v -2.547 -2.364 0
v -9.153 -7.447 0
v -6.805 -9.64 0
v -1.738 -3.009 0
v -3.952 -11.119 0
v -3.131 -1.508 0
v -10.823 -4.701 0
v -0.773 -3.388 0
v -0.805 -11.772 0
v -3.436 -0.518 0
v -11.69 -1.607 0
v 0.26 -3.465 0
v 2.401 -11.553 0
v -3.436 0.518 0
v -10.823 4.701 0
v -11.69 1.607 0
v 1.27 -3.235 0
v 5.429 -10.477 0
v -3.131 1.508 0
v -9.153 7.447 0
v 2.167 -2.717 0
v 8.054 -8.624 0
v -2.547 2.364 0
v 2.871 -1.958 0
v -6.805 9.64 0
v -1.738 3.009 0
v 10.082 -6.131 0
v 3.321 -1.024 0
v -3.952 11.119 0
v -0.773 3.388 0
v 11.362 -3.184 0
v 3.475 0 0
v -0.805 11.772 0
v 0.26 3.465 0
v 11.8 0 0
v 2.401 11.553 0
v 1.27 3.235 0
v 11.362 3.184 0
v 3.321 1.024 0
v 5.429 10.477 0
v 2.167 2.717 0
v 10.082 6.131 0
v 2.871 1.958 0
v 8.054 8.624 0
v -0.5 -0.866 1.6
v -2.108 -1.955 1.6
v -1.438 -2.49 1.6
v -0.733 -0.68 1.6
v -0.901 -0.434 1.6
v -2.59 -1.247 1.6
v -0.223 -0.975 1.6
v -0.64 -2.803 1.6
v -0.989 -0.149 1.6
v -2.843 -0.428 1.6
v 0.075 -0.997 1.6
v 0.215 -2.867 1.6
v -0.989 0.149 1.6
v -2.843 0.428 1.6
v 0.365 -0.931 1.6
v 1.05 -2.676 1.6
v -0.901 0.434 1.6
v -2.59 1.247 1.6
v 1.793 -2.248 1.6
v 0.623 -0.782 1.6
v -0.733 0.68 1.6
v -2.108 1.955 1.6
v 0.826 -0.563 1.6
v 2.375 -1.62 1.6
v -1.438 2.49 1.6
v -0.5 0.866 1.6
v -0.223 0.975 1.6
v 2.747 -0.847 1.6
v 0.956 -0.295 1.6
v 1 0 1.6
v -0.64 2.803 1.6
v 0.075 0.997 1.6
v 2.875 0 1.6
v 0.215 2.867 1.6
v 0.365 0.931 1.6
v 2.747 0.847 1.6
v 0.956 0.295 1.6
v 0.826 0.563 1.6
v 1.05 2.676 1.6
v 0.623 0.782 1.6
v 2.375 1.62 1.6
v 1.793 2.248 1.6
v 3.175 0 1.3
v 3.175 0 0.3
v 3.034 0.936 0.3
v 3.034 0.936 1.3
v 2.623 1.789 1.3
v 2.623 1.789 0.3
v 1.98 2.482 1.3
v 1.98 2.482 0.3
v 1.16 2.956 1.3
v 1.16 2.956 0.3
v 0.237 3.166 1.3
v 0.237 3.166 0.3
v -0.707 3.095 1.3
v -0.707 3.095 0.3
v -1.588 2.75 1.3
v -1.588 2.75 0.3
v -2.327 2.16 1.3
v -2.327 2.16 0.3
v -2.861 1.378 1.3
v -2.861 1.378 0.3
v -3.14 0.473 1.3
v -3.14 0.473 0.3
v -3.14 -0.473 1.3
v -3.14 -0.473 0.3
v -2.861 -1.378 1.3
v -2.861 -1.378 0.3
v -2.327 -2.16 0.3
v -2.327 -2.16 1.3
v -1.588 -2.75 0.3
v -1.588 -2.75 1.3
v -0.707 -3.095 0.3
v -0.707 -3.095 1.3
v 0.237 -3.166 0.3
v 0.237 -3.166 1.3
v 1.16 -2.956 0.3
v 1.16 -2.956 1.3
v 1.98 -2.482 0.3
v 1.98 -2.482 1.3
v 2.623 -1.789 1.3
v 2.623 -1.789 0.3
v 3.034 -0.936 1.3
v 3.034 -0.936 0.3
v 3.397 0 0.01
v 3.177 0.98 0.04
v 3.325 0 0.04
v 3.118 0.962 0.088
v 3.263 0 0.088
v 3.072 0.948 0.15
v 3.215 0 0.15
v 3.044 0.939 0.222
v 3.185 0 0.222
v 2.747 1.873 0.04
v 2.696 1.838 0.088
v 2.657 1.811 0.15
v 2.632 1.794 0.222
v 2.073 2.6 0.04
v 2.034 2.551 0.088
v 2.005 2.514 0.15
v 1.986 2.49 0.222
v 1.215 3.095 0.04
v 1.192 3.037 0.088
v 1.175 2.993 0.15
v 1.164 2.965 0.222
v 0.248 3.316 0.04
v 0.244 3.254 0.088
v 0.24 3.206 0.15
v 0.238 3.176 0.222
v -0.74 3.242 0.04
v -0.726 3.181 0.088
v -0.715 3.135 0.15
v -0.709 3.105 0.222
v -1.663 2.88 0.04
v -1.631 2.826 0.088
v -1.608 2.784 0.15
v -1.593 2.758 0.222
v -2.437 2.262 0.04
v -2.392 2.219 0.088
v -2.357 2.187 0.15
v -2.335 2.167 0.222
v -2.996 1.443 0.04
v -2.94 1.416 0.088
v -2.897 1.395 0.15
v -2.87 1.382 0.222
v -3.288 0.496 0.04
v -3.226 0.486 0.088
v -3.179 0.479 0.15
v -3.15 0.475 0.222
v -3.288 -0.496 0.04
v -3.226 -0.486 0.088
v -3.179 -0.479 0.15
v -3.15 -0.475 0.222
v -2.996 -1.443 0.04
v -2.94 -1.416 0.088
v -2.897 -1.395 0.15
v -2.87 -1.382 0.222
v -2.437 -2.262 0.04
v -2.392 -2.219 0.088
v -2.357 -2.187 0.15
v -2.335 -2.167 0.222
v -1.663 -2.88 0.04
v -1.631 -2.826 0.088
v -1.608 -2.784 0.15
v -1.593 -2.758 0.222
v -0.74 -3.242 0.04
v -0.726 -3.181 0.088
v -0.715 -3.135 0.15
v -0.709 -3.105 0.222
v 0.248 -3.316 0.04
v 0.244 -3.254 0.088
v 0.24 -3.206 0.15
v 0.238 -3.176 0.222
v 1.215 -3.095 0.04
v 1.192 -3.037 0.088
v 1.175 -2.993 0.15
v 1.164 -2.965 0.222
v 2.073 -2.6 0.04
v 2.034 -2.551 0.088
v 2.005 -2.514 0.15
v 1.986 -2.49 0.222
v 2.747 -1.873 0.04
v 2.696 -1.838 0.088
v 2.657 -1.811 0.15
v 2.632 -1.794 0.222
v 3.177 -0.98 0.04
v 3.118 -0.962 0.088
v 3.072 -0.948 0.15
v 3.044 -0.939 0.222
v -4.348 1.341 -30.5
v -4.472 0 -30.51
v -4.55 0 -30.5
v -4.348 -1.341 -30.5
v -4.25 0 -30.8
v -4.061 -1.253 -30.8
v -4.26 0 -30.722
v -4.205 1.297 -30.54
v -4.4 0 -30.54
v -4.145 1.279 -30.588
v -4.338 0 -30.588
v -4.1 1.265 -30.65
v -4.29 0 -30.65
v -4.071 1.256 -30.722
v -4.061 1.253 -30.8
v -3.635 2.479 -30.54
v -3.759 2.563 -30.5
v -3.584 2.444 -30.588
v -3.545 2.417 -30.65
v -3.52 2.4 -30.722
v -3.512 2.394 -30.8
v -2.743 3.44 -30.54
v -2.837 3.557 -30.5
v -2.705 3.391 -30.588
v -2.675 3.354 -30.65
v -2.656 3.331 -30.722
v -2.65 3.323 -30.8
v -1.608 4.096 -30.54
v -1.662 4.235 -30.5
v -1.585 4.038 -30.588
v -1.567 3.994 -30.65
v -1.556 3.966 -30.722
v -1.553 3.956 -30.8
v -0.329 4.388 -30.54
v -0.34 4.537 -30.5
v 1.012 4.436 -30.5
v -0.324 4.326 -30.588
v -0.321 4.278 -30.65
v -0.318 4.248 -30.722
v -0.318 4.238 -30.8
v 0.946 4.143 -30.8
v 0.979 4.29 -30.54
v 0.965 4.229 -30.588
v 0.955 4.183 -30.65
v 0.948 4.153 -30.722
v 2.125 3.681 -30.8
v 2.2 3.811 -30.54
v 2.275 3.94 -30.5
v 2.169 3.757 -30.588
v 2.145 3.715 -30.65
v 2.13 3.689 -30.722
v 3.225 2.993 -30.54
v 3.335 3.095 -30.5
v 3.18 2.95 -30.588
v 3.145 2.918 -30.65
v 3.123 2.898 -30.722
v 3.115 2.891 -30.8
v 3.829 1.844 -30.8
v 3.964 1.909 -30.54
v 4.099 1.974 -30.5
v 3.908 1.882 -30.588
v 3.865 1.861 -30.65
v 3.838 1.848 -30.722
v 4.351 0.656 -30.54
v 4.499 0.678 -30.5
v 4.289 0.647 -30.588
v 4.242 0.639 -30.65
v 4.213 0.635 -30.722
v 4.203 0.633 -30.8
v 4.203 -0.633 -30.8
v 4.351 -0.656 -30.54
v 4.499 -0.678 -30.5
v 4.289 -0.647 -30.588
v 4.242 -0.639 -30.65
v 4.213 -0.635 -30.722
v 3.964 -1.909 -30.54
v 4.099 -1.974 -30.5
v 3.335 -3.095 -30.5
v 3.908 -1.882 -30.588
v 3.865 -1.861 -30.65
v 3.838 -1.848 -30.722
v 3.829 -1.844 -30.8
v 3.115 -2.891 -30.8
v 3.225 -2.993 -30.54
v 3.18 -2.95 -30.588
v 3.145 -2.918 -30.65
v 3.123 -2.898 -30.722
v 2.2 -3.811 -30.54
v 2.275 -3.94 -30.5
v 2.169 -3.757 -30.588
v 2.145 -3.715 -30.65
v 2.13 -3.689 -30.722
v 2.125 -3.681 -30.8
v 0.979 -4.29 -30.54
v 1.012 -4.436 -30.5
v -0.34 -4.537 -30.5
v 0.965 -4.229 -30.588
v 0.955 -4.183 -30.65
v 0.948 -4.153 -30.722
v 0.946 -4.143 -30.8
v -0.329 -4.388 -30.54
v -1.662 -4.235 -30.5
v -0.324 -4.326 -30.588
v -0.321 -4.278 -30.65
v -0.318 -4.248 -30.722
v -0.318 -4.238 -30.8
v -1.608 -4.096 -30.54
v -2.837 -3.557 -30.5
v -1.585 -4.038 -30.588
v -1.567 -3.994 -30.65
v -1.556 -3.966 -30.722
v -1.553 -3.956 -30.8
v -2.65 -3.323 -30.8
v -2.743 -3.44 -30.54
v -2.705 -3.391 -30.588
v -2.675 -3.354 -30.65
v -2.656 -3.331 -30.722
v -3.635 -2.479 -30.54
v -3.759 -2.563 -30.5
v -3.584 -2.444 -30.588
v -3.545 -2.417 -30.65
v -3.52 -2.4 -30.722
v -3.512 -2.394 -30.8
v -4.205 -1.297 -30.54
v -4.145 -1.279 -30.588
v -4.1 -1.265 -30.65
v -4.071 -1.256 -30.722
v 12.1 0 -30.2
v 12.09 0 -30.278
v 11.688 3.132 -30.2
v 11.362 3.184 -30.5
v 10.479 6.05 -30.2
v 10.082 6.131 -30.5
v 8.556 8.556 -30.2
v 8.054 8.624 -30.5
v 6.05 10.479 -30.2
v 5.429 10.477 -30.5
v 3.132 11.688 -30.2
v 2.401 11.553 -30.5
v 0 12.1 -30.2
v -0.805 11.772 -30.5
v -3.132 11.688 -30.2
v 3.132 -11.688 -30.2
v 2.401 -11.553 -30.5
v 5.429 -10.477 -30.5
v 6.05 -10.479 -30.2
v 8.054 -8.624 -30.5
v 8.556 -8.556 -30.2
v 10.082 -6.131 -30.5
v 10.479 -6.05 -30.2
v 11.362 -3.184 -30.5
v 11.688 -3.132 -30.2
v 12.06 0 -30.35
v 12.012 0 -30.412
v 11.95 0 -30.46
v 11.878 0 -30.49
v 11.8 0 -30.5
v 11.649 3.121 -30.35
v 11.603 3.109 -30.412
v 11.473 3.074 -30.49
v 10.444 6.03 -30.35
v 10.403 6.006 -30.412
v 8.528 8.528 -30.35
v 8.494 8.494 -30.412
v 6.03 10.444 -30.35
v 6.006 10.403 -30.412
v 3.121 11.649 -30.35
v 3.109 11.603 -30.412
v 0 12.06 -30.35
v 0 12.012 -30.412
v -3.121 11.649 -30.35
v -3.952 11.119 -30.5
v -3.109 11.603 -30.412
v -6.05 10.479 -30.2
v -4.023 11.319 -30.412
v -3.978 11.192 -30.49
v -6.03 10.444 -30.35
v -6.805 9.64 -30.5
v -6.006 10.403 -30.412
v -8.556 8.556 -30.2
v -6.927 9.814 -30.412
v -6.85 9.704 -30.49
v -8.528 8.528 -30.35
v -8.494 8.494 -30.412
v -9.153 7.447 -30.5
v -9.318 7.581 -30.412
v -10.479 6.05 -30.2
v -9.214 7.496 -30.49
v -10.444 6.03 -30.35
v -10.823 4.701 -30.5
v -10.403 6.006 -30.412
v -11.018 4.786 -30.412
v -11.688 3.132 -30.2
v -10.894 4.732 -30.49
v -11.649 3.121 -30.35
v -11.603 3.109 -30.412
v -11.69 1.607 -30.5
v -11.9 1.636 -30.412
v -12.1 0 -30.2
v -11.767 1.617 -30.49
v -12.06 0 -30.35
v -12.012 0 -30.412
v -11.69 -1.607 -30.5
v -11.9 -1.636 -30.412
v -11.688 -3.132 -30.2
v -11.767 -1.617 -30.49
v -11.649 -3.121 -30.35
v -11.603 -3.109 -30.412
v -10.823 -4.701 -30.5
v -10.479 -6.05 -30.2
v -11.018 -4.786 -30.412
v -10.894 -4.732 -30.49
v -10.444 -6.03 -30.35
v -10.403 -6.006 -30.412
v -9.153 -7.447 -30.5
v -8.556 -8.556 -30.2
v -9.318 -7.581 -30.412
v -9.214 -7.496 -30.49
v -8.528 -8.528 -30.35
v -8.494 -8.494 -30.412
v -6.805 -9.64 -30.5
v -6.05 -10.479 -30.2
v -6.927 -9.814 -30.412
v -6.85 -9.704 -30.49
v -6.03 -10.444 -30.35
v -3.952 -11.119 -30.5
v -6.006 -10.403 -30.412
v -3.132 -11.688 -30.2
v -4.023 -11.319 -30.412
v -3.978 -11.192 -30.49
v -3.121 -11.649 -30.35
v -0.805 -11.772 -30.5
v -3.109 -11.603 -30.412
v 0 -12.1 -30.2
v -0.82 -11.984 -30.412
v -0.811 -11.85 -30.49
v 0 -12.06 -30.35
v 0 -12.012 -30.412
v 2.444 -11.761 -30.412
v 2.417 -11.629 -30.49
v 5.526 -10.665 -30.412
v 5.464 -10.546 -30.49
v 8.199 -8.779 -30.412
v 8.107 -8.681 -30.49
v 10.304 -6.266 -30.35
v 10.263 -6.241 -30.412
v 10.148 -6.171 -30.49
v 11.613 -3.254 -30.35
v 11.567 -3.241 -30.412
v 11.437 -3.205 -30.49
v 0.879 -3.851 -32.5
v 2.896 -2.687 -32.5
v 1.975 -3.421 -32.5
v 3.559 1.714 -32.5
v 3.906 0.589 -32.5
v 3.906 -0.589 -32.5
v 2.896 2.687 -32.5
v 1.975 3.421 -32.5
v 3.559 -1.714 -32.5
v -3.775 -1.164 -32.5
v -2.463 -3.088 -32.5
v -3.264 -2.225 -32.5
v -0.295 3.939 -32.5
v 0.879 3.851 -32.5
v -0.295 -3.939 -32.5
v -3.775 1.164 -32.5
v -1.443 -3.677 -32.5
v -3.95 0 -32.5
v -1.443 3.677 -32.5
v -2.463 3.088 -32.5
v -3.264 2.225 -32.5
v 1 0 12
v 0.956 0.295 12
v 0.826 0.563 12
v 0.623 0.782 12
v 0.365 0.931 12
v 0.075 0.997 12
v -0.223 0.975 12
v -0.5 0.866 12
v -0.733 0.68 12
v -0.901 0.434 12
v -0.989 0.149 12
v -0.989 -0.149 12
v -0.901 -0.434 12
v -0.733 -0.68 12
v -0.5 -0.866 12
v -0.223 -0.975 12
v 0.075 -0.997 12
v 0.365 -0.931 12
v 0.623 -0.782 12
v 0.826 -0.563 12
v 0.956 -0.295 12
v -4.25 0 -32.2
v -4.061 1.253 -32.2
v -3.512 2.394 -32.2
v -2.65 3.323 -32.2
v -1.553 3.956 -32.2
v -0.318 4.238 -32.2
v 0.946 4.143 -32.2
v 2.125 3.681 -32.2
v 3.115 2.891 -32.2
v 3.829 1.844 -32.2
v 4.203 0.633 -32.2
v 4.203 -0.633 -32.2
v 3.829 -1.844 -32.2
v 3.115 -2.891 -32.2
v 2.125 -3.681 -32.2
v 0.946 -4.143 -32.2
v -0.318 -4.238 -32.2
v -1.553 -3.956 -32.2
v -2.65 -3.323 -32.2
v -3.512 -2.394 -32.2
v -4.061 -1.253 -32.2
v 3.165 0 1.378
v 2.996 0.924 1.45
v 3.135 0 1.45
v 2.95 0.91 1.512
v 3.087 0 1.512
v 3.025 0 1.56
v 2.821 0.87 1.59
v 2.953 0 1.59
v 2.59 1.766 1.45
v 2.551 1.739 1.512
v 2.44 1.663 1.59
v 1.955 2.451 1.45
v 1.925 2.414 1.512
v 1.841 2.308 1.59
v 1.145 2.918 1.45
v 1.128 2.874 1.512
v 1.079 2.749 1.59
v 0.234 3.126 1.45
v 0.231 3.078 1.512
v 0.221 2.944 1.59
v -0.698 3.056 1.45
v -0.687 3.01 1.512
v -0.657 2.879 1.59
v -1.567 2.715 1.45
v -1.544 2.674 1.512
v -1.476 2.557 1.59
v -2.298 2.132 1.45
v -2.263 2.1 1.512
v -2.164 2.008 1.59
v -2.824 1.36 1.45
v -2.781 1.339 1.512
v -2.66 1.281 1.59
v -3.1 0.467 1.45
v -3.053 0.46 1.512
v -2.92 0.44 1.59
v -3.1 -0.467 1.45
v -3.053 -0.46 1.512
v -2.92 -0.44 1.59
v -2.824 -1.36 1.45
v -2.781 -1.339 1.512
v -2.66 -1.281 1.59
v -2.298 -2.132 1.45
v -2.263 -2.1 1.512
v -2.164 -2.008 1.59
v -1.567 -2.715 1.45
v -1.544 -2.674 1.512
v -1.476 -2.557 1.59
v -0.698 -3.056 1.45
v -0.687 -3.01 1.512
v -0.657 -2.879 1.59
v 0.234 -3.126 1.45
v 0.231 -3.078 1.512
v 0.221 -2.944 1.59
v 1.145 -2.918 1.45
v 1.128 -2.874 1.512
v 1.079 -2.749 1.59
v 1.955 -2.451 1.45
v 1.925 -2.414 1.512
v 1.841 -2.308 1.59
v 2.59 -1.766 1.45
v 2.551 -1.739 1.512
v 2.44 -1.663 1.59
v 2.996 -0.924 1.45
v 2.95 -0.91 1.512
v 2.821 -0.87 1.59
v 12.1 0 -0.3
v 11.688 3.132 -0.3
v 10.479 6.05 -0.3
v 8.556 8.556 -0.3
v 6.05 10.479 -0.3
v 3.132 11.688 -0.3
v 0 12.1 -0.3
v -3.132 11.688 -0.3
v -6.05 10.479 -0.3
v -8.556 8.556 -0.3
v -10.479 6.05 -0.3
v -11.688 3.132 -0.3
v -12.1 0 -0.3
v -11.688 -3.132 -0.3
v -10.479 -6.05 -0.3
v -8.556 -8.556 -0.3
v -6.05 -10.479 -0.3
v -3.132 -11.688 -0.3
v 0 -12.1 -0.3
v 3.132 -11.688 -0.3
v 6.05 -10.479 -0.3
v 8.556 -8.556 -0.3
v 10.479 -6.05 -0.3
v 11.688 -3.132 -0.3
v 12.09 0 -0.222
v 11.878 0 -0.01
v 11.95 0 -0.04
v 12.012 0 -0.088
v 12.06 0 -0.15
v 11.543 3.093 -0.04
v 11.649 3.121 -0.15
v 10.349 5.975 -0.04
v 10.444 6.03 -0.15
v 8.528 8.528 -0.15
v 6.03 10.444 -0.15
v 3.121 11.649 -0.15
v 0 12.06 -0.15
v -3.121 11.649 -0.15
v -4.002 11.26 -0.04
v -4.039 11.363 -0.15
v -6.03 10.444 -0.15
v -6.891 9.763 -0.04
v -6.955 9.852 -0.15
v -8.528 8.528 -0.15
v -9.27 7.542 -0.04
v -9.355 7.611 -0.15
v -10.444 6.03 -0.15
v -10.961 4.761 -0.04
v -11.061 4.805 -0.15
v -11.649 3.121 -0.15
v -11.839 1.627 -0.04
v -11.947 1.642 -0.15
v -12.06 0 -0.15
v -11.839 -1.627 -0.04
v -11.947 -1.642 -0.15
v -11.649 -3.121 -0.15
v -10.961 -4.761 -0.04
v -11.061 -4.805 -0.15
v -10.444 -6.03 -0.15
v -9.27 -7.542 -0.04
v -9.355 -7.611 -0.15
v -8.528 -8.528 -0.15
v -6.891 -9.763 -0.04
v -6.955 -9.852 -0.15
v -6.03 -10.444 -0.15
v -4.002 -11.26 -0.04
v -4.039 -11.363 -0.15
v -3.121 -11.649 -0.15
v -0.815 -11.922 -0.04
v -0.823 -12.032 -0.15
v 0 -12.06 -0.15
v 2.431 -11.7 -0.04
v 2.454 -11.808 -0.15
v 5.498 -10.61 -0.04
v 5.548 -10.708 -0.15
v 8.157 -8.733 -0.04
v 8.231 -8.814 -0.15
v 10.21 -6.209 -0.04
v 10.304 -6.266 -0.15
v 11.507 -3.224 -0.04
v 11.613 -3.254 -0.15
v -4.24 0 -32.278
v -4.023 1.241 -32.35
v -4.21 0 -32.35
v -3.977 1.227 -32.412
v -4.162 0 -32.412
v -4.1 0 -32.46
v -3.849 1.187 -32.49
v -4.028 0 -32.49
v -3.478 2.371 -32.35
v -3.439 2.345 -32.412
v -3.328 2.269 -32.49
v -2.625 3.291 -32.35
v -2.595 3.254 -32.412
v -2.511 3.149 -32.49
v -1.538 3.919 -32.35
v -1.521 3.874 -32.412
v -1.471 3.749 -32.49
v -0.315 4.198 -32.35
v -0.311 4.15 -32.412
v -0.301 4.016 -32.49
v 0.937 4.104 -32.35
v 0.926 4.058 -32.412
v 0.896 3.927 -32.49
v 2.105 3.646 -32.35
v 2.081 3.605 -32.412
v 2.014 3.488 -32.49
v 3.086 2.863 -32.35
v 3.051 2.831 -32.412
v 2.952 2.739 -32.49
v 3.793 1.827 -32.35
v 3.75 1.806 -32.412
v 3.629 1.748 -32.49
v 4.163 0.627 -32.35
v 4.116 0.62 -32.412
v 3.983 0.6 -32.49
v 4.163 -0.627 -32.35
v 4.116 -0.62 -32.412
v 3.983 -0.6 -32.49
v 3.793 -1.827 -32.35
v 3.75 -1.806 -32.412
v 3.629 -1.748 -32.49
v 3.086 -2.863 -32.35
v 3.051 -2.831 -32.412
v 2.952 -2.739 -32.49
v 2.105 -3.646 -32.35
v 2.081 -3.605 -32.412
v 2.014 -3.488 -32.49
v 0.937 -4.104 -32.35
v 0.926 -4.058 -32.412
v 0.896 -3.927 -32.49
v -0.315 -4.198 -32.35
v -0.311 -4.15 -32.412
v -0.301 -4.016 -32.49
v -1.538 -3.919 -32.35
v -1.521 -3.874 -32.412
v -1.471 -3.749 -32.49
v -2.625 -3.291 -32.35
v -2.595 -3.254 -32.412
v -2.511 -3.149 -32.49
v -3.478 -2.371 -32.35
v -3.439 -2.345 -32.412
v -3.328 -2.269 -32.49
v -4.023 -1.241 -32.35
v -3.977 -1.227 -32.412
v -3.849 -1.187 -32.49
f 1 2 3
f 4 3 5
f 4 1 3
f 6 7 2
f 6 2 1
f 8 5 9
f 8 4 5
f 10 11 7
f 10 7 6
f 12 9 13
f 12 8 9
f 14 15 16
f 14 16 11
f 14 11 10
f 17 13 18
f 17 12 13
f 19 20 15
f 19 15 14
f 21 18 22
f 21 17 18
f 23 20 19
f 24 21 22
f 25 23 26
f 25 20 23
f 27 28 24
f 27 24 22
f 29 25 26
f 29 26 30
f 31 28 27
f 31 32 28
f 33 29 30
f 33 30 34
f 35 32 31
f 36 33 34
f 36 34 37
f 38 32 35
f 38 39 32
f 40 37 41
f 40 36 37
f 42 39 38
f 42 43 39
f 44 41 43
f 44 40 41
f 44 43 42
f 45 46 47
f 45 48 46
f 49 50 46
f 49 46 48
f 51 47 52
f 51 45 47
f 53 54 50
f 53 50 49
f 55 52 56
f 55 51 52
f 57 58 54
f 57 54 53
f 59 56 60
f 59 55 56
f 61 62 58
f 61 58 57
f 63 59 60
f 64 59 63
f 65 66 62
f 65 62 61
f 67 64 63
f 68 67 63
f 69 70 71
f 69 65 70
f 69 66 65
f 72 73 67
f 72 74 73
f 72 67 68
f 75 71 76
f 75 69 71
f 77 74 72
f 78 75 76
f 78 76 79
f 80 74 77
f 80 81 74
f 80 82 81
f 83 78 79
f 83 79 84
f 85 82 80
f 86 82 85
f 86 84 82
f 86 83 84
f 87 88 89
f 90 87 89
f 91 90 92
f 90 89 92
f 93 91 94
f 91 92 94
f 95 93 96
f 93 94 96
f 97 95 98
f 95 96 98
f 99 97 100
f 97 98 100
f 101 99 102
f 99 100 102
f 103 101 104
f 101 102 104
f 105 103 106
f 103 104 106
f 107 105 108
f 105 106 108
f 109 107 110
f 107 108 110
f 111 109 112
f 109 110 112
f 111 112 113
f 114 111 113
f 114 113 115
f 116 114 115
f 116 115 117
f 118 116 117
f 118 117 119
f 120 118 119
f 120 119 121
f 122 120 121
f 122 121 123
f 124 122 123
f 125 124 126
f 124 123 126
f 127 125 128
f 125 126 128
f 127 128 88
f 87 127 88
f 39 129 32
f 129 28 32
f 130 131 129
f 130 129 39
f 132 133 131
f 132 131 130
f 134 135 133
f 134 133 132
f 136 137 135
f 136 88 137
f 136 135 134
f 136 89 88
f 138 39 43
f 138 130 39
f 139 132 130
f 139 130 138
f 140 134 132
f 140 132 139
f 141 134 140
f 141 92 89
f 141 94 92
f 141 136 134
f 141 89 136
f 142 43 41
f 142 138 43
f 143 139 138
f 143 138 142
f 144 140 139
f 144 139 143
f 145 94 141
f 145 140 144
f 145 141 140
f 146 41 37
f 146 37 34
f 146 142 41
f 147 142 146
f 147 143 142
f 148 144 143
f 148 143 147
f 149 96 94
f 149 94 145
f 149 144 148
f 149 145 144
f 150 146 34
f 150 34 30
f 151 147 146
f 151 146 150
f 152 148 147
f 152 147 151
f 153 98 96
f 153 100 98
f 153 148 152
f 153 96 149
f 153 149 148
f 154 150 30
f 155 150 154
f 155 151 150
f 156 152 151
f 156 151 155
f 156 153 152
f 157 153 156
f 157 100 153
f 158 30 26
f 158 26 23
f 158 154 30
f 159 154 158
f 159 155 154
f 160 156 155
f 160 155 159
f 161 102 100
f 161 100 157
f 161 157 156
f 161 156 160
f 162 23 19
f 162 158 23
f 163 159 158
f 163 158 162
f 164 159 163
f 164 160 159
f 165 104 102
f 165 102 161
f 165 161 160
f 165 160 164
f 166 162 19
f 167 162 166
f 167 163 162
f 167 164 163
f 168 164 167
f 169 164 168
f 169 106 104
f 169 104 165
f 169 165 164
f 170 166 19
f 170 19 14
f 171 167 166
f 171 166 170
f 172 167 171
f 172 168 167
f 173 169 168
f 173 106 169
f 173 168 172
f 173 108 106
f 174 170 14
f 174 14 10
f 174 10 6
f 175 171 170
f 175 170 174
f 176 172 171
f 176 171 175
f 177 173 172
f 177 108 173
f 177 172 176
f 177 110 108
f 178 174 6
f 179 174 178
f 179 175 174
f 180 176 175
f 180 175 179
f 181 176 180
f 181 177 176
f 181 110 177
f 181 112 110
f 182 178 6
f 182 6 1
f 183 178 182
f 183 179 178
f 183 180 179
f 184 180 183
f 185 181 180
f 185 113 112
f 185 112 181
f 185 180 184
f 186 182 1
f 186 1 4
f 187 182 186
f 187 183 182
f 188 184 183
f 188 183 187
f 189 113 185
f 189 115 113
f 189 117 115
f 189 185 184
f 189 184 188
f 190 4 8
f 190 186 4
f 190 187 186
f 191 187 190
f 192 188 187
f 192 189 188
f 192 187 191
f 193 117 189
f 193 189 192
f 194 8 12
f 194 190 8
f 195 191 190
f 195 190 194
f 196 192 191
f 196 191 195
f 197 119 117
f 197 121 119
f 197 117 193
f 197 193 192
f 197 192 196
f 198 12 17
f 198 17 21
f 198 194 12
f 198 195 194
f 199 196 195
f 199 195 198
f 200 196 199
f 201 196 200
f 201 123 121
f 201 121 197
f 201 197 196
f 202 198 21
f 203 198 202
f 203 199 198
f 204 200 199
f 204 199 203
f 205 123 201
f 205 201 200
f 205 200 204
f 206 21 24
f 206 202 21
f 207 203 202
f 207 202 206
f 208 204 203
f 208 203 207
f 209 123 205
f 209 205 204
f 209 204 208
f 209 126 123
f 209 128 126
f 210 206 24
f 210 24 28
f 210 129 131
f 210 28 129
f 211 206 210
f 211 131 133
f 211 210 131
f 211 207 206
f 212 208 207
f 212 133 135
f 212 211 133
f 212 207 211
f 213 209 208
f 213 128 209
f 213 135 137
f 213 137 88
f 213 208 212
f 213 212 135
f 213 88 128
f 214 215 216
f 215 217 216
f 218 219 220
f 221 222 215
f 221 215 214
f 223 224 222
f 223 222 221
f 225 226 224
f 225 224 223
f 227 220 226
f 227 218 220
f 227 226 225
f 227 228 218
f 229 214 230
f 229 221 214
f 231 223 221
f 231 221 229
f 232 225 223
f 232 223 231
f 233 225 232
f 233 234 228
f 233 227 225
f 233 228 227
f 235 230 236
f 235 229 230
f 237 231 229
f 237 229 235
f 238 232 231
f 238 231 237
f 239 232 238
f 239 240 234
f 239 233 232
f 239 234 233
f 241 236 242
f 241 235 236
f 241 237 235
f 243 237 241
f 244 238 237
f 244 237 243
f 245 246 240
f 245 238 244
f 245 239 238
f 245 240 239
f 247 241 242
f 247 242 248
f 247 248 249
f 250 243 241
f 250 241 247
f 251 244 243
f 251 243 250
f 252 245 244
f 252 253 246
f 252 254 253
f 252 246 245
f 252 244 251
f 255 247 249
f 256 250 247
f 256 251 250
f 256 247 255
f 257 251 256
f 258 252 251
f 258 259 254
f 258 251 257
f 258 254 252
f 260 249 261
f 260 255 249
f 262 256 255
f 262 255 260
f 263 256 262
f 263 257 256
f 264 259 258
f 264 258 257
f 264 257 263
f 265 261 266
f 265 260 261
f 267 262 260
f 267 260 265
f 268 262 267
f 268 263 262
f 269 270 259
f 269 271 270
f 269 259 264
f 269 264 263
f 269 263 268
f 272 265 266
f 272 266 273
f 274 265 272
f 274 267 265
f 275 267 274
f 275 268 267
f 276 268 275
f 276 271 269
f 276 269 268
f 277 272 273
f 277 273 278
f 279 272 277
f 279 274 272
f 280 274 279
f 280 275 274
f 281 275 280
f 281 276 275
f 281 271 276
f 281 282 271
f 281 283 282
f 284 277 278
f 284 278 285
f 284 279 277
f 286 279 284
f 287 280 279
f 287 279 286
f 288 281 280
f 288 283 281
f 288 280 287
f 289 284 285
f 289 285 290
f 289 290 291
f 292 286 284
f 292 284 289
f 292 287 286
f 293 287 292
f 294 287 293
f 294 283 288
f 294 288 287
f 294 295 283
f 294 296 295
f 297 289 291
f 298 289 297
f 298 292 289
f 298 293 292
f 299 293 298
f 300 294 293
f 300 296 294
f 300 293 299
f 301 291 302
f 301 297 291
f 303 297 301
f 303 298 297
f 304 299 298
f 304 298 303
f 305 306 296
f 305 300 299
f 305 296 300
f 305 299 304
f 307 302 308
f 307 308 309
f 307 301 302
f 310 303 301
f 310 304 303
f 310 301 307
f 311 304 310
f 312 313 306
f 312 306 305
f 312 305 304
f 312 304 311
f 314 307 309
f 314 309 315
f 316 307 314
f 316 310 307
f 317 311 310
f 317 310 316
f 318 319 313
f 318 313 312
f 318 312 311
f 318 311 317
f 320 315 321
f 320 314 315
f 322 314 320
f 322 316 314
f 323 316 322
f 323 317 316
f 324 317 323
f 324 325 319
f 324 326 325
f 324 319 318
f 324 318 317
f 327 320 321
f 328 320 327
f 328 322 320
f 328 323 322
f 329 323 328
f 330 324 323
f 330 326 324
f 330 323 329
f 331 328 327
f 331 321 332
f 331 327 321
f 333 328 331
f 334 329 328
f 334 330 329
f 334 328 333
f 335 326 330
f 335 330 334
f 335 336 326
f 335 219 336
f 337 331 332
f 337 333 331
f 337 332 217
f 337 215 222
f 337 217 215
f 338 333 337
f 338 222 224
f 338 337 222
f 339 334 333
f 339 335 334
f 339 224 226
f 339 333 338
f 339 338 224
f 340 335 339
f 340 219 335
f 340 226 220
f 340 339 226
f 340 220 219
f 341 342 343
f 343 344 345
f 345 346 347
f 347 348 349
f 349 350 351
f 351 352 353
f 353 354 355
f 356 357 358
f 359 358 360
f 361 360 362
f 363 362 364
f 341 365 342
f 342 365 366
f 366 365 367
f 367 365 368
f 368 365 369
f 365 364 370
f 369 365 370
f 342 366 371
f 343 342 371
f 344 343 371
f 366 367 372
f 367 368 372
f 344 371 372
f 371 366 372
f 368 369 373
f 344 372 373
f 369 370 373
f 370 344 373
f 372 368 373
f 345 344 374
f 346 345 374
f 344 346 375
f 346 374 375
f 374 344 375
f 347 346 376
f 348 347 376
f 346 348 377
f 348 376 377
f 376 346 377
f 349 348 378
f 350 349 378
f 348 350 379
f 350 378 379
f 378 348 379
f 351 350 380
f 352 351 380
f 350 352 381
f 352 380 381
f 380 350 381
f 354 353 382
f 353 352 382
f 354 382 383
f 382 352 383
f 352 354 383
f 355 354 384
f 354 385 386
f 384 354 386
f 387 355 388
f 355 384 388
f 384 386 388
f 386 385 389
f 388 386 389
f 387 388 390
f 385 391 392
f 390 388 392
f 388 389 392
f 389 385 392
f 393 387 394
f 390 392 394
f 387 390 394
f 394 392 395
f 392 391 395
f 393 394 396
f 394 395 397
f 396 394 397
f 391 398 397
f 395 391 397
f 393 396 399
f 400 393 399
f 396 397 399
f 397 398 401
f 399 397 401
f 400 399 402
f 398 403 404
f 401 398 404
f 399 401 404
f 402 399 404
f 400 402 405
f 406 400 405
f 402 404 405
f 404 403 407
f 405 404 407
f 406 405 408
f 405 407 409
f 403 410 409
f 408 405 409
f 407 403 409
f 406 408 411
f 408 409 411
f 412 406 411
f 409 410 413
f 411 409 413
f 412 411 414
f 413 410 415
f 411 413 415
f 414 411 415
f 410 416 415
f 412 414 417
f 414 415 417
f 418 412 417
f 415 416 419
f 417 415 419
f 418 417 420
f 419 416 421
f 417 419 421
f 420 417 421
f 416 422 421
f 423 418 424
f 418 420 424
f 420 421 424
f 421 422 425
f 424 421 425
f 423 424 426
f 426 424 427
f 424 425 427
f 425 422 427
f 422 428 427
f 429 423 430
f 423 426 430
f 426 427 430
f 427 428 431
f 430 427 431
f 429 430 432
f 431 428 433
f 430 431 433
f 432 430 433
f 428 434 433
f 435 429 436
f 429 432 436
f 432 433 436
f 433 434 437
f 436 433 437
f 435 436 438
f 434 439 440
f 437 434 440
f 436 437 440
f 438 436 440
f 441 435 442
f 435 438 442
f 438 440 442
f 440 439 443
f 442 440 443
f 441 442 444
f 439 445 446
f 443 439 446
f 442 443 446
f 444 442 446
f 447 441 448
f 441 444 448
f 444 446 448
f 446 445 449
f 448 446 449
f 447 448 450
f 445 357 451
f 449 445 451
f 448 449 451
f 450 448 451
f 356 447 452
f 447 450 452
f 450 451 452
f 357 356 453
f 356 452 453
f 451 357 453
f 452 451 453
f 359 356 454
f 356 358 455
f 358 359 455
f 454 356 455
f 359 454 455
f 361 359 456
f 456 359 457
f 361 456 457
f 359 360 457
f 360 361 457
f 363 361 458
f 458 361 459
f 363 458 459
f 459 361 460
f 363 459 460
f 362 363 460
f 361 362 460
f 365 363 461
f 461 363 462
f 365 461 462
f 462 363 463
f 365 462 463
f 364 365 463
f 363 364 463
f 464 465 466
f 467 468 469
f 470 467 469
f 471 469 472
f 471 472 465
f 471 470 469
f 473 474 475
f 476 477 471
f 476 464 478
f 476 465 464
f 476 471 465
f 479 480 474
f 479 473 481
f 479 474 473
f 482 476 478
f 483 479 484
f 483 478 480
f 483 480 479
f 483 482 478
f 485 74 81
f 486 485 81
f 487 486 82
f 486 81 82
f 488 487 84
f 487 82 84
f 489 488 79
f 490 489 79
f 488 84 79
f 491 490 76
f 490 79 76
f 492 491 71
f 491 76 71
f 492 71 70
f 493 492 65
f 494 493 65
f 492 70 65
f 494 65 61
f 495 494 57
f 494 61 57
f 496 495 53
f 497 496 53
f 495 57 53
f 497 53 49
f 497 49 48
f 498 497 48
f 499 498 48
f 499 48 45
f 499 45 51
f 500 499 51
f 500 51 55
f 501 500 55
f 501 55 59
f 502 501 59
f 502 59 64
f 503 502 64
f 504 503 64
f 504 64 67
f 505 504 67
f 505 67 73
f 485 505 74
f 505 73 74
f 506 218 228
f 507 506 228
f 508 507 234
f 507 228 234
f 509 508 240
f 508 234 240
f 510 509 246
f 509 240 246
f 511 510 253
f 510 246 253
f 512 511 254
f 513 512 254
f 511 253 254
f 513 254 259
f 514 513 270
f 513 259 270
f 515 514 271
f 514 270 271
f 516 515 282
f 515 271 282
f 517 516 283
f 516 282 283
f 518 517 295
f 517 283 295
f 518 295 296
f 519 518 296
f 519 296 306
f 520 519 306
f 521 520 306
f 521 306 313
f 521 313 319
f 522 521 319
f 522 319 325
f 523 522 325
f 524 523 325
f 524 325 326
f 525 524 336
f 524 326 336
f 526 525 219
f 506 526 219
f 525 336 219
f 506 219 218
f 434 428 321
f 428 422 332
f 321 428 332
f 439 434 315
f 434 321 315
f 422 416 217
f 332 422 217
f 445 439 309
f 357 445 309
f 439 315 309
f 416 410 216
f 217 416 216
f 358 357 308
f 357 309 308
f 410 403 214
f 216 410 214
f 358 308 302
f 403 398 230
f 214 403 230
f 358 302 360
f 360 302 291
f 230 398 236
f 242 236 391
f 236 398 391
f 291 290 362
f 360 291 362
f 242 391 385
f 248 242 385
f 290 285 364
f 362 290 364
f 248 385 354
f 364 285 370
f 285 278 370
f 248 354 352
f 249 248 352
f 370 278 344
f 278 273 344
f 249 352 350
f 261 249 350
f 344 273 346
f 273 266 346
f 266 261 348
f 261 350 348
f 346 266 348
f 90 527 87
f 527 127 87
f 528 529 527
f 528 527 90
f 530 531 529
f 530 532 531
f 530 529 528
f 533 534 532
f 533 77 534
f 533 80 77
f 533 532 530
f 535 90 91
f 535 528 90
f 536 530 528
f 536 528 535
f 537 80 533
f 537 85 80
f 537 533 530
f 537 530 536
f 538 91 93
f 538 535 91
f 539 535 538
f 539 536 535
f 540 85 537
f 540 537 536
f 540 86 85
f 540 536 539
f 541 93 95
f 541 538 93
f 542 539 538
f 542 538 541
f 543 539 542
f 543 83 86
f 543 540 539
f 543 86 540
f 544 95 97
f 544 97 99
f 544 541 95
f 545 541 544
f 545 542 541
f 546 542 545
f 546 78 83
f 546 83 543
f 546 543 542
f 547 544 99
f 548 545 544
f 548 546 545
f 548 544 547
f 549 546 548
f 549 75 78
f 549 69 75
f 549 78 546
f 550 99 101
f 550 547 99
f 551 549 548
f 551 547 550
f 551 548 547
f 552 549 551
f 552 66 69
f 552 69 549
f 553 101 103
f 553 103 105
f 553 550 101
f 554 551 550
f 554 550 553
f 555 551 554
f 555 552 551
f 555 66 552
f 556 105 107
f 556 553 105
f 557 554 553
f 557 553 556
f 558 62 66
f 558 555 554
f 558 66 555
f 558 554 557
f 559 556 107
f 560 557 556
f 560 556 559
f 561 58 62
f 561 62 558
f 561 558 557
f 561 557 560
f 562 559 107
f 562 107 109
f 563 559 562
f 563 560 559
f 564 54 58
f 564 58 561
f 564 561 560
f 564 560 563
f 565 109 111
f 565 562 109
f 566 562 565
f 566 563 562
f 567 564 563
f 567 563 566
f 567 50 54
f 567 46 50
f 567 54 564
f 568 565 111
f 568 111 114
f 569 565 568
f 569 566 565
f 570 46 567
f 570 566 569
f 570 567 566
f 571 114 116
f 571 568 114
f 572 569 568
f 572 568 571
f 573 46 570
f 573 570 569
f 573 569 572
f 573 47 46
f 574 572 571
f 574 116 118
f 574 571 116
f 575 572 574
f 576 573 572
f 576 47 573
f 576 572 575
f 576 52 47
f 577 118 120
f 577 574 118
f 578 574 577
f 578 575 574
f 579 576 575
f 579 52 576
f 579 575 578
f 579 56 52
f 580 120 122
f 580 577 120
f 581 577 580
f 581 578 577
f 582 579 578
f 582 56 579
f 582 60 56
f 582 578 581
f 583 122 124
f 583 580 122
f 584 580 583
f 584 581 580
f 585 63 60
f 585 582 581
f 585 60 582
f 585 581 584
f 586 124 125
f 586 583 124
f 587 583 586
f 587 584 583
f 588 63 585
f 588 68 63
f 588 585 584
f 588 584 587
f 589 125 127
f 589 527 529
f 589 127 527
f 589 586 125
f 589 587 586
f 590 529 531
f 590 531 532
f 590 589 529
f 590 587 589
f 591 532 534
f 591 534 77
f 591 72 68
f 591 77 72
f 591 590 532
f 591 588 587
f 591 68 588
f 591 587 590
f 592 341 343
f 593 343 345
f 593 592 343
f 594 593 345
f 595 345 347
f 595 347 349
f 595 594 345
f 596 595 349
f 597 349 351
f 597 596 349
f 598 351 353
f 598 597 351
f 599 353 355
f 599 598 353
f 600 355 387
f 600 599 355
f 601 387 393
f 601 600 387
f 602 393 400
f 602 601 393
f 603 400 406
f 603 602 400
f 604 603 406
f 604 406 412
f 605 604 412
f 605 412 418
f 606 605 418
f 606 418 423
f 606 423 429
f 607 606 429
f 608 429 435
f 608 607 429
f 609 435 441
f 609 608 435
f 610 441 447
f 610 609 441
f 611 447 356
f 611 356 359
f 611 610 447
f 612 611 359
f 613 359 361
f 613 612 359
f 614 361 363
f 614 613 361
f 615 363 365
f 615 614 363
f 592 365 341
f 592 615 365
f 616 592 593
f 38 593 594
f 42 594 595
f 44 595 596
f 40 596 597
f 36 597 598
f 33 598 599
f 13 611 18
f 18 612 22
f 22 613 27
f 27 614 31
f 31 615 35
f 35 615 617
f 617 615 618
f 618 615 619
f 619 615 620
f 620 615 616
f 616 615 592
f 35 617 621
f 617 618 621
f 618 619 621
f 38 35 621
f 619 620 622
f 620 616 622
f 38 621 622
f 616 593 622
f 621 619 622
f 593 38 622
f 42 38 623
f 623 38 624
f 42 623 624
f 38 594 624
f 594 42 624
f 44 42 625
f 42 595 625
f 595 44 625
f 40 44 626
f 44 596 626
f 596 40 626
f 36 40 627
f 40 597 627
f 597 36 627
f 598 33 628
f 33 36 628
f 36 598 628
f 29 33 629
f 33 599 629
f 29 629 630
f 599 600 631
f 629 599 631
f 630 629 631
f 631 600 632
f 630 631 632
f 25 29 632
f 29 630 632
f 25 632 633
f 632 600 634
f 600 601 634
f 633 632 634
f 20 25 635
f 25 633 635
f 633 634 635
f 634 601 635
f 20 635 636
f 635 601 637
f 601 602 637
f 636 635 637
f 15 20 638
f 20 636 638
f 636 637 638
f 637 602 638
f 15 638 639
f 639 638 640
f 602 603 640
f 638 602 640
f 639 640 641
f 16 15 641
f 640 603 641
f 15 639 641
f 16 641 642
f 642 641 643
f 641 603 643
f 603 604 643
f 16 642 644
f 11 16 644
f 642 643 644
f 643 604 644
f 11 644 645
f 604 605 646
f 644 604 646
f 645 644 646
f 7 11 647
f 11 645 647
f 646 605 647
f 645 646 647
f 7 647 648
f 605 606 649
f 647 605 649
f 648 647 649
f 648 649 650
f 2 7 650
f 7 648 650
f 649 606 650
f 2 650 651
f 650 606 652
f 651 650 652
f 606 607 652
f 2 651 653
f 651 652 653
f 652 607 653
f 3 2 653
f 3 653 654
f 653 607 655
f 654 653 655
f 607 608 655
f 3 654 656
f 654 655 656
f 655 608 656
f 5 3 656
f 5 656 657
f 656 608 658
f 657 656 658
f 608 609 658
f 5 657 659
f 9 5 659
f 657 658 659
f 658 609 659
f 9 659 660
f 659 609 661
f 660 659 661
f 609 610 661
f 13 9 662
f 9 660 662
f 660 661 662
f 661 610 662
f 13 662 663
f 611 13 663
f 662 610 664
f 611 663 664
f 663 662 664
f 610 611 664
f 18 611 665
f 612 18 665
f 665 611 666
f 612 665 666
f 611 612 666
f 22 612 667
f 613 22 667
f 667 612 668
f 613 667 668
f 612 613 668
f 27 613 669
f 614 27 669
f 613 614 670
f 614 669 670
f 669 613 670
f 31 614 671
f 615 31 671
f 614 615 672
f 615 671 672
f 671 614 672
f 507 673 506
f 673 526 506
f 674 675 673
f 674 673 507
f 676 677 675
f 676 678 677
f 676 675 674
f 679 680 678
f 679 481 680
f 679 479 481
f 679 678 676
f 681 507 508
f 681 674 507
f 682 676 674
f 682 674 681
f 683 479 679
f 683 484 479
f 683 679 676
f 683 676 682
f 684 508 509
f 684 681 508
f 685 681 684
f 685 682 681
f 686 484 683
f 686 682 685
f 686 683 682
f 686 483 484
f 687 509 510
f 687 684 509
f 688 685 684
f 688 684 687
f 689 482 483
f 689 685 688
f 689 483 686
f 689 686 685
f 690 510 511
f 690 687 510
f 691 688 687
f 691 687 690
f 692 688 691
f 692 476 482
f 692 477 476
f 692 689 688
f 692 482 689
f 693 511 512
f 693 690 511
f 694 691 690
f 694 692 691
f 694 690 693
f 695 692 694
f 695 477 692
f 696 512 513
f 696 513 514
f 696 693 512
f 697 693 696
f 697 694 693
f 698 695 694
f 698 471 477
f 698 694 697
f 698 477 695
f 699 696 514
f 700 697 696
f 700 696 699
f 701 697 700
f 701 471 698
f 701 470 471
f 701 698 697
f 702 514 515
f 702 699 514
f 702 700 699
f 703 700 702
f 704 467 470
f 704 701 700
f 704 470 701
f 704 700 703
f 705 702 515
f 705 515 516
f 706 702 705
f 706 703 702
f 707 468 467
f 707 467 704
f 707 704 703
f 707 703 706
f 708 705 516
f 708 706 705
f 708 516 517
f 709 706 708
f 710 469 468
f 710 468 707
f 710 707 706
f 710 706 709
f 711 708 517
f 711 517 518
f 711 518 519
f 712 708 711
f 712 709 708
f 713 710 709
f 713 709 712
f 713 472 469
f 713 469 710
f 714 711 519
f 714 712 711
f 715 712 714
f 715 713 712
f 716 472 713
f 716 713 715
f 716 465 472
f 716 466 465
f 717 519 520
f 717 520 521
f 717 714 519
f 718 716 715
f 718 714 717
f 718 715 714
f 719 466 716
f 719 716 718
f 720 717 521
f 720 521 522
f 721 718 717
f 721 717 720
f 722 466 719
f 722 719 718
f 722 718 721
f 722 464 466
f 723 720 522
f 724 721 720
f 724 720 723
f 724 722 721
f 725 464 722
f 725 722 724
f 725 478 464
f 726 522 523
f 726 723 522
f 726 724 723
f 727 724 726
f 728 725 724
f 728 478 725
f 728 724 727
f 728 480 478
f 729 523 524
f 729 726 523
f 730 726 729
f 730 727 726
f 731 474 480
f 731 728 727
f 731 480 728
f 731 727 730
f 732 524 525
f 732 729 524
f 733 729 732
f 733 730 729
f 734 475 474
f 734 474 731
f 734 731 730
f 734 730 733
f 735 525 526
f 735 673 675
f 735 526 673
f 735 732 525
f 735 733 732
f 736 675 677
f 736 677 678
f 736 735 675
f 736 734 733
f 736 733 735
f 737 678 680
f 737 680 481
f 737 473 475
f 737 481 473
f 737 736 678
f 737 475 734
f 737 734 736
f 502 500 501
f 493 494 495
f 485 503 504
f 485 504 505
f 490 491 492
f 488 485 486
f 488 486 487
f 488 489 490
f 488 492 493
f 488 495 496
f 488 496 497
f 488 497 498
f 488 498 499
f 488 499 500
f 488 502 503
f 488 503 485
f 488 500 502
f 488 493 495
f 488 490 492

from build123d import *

# Parameters (mm, degrees)
SKETCH1_R           = 12.1
BOSS_EXTRUDE1_DEPTH = 30.5
SKETCH3_R           = 3.175
BOSS_EXTRUDE2_DEPTH = 1.6
SKETCH4_R           = 1
BOSS_EXTRUDE3_DEPTH = 10.4
SKETCH5_R           = 4.25
BOSS_EXTRUDE4_DEPTH = 2
FILLET1_R           = 0.3
FILLET2_R           = 0.3


with BuildPart() as part:
    # Sketch1 → Boss-Extrude1 (new body)
    with BuildSketch(Plane.XY):
        Circle(SKETCH1_R)
    extrude(amount=-BOSS_EXTRUDE1_DEPTH)

    # Sketch3 → Boss-Extrude2 (add)
    with BuildSketch(Plane.XY):
        Circle(SKETCH3_R)
    extrude(amount=BOSS_EXTRUDE2_DEPTH)

    # Sketch4 → Boss-Extrude3 (add)
    with BuildSketch(Plane.XY.offset(1.6)):
        Circle(SKETCH4_R)
    extrude(amount=BOSS_EXTRUDE3_DEPTH)

    # Sketch5 → Boss-Extrude4 (add)
    with BuildSketch(Plane(origin=(0, 0, -30.5), x_dir=(-1, 0, 0), z_dir=(0, 0, -1))):
        Circle(SKETCH5_R)
    extrude(amount=BOSS_EXTRUDE4_DEPTH)

    # Fillet1
    fillet1_edges = [part.edges().sort_by_distance(p)[0] for p in [
        (-3.175, 0, 0),
    ]]
    fillet(fillet1_edges, radius=FILLET1_R)

    # Fillet2
    fillet2_edges = [part.edges().sort_by_distance(p)[0] for p in [
        (4.25, 0, -30.5),
        (4.25, 0, -32.5),
        (-12.1, 0, 0),
        (-12.1, 0, -30.5),
        (-3.175, 0, 1.6),
    ]]
    fillet(fillet2_edges, radius=FILLET2_R)


solid = part.part
